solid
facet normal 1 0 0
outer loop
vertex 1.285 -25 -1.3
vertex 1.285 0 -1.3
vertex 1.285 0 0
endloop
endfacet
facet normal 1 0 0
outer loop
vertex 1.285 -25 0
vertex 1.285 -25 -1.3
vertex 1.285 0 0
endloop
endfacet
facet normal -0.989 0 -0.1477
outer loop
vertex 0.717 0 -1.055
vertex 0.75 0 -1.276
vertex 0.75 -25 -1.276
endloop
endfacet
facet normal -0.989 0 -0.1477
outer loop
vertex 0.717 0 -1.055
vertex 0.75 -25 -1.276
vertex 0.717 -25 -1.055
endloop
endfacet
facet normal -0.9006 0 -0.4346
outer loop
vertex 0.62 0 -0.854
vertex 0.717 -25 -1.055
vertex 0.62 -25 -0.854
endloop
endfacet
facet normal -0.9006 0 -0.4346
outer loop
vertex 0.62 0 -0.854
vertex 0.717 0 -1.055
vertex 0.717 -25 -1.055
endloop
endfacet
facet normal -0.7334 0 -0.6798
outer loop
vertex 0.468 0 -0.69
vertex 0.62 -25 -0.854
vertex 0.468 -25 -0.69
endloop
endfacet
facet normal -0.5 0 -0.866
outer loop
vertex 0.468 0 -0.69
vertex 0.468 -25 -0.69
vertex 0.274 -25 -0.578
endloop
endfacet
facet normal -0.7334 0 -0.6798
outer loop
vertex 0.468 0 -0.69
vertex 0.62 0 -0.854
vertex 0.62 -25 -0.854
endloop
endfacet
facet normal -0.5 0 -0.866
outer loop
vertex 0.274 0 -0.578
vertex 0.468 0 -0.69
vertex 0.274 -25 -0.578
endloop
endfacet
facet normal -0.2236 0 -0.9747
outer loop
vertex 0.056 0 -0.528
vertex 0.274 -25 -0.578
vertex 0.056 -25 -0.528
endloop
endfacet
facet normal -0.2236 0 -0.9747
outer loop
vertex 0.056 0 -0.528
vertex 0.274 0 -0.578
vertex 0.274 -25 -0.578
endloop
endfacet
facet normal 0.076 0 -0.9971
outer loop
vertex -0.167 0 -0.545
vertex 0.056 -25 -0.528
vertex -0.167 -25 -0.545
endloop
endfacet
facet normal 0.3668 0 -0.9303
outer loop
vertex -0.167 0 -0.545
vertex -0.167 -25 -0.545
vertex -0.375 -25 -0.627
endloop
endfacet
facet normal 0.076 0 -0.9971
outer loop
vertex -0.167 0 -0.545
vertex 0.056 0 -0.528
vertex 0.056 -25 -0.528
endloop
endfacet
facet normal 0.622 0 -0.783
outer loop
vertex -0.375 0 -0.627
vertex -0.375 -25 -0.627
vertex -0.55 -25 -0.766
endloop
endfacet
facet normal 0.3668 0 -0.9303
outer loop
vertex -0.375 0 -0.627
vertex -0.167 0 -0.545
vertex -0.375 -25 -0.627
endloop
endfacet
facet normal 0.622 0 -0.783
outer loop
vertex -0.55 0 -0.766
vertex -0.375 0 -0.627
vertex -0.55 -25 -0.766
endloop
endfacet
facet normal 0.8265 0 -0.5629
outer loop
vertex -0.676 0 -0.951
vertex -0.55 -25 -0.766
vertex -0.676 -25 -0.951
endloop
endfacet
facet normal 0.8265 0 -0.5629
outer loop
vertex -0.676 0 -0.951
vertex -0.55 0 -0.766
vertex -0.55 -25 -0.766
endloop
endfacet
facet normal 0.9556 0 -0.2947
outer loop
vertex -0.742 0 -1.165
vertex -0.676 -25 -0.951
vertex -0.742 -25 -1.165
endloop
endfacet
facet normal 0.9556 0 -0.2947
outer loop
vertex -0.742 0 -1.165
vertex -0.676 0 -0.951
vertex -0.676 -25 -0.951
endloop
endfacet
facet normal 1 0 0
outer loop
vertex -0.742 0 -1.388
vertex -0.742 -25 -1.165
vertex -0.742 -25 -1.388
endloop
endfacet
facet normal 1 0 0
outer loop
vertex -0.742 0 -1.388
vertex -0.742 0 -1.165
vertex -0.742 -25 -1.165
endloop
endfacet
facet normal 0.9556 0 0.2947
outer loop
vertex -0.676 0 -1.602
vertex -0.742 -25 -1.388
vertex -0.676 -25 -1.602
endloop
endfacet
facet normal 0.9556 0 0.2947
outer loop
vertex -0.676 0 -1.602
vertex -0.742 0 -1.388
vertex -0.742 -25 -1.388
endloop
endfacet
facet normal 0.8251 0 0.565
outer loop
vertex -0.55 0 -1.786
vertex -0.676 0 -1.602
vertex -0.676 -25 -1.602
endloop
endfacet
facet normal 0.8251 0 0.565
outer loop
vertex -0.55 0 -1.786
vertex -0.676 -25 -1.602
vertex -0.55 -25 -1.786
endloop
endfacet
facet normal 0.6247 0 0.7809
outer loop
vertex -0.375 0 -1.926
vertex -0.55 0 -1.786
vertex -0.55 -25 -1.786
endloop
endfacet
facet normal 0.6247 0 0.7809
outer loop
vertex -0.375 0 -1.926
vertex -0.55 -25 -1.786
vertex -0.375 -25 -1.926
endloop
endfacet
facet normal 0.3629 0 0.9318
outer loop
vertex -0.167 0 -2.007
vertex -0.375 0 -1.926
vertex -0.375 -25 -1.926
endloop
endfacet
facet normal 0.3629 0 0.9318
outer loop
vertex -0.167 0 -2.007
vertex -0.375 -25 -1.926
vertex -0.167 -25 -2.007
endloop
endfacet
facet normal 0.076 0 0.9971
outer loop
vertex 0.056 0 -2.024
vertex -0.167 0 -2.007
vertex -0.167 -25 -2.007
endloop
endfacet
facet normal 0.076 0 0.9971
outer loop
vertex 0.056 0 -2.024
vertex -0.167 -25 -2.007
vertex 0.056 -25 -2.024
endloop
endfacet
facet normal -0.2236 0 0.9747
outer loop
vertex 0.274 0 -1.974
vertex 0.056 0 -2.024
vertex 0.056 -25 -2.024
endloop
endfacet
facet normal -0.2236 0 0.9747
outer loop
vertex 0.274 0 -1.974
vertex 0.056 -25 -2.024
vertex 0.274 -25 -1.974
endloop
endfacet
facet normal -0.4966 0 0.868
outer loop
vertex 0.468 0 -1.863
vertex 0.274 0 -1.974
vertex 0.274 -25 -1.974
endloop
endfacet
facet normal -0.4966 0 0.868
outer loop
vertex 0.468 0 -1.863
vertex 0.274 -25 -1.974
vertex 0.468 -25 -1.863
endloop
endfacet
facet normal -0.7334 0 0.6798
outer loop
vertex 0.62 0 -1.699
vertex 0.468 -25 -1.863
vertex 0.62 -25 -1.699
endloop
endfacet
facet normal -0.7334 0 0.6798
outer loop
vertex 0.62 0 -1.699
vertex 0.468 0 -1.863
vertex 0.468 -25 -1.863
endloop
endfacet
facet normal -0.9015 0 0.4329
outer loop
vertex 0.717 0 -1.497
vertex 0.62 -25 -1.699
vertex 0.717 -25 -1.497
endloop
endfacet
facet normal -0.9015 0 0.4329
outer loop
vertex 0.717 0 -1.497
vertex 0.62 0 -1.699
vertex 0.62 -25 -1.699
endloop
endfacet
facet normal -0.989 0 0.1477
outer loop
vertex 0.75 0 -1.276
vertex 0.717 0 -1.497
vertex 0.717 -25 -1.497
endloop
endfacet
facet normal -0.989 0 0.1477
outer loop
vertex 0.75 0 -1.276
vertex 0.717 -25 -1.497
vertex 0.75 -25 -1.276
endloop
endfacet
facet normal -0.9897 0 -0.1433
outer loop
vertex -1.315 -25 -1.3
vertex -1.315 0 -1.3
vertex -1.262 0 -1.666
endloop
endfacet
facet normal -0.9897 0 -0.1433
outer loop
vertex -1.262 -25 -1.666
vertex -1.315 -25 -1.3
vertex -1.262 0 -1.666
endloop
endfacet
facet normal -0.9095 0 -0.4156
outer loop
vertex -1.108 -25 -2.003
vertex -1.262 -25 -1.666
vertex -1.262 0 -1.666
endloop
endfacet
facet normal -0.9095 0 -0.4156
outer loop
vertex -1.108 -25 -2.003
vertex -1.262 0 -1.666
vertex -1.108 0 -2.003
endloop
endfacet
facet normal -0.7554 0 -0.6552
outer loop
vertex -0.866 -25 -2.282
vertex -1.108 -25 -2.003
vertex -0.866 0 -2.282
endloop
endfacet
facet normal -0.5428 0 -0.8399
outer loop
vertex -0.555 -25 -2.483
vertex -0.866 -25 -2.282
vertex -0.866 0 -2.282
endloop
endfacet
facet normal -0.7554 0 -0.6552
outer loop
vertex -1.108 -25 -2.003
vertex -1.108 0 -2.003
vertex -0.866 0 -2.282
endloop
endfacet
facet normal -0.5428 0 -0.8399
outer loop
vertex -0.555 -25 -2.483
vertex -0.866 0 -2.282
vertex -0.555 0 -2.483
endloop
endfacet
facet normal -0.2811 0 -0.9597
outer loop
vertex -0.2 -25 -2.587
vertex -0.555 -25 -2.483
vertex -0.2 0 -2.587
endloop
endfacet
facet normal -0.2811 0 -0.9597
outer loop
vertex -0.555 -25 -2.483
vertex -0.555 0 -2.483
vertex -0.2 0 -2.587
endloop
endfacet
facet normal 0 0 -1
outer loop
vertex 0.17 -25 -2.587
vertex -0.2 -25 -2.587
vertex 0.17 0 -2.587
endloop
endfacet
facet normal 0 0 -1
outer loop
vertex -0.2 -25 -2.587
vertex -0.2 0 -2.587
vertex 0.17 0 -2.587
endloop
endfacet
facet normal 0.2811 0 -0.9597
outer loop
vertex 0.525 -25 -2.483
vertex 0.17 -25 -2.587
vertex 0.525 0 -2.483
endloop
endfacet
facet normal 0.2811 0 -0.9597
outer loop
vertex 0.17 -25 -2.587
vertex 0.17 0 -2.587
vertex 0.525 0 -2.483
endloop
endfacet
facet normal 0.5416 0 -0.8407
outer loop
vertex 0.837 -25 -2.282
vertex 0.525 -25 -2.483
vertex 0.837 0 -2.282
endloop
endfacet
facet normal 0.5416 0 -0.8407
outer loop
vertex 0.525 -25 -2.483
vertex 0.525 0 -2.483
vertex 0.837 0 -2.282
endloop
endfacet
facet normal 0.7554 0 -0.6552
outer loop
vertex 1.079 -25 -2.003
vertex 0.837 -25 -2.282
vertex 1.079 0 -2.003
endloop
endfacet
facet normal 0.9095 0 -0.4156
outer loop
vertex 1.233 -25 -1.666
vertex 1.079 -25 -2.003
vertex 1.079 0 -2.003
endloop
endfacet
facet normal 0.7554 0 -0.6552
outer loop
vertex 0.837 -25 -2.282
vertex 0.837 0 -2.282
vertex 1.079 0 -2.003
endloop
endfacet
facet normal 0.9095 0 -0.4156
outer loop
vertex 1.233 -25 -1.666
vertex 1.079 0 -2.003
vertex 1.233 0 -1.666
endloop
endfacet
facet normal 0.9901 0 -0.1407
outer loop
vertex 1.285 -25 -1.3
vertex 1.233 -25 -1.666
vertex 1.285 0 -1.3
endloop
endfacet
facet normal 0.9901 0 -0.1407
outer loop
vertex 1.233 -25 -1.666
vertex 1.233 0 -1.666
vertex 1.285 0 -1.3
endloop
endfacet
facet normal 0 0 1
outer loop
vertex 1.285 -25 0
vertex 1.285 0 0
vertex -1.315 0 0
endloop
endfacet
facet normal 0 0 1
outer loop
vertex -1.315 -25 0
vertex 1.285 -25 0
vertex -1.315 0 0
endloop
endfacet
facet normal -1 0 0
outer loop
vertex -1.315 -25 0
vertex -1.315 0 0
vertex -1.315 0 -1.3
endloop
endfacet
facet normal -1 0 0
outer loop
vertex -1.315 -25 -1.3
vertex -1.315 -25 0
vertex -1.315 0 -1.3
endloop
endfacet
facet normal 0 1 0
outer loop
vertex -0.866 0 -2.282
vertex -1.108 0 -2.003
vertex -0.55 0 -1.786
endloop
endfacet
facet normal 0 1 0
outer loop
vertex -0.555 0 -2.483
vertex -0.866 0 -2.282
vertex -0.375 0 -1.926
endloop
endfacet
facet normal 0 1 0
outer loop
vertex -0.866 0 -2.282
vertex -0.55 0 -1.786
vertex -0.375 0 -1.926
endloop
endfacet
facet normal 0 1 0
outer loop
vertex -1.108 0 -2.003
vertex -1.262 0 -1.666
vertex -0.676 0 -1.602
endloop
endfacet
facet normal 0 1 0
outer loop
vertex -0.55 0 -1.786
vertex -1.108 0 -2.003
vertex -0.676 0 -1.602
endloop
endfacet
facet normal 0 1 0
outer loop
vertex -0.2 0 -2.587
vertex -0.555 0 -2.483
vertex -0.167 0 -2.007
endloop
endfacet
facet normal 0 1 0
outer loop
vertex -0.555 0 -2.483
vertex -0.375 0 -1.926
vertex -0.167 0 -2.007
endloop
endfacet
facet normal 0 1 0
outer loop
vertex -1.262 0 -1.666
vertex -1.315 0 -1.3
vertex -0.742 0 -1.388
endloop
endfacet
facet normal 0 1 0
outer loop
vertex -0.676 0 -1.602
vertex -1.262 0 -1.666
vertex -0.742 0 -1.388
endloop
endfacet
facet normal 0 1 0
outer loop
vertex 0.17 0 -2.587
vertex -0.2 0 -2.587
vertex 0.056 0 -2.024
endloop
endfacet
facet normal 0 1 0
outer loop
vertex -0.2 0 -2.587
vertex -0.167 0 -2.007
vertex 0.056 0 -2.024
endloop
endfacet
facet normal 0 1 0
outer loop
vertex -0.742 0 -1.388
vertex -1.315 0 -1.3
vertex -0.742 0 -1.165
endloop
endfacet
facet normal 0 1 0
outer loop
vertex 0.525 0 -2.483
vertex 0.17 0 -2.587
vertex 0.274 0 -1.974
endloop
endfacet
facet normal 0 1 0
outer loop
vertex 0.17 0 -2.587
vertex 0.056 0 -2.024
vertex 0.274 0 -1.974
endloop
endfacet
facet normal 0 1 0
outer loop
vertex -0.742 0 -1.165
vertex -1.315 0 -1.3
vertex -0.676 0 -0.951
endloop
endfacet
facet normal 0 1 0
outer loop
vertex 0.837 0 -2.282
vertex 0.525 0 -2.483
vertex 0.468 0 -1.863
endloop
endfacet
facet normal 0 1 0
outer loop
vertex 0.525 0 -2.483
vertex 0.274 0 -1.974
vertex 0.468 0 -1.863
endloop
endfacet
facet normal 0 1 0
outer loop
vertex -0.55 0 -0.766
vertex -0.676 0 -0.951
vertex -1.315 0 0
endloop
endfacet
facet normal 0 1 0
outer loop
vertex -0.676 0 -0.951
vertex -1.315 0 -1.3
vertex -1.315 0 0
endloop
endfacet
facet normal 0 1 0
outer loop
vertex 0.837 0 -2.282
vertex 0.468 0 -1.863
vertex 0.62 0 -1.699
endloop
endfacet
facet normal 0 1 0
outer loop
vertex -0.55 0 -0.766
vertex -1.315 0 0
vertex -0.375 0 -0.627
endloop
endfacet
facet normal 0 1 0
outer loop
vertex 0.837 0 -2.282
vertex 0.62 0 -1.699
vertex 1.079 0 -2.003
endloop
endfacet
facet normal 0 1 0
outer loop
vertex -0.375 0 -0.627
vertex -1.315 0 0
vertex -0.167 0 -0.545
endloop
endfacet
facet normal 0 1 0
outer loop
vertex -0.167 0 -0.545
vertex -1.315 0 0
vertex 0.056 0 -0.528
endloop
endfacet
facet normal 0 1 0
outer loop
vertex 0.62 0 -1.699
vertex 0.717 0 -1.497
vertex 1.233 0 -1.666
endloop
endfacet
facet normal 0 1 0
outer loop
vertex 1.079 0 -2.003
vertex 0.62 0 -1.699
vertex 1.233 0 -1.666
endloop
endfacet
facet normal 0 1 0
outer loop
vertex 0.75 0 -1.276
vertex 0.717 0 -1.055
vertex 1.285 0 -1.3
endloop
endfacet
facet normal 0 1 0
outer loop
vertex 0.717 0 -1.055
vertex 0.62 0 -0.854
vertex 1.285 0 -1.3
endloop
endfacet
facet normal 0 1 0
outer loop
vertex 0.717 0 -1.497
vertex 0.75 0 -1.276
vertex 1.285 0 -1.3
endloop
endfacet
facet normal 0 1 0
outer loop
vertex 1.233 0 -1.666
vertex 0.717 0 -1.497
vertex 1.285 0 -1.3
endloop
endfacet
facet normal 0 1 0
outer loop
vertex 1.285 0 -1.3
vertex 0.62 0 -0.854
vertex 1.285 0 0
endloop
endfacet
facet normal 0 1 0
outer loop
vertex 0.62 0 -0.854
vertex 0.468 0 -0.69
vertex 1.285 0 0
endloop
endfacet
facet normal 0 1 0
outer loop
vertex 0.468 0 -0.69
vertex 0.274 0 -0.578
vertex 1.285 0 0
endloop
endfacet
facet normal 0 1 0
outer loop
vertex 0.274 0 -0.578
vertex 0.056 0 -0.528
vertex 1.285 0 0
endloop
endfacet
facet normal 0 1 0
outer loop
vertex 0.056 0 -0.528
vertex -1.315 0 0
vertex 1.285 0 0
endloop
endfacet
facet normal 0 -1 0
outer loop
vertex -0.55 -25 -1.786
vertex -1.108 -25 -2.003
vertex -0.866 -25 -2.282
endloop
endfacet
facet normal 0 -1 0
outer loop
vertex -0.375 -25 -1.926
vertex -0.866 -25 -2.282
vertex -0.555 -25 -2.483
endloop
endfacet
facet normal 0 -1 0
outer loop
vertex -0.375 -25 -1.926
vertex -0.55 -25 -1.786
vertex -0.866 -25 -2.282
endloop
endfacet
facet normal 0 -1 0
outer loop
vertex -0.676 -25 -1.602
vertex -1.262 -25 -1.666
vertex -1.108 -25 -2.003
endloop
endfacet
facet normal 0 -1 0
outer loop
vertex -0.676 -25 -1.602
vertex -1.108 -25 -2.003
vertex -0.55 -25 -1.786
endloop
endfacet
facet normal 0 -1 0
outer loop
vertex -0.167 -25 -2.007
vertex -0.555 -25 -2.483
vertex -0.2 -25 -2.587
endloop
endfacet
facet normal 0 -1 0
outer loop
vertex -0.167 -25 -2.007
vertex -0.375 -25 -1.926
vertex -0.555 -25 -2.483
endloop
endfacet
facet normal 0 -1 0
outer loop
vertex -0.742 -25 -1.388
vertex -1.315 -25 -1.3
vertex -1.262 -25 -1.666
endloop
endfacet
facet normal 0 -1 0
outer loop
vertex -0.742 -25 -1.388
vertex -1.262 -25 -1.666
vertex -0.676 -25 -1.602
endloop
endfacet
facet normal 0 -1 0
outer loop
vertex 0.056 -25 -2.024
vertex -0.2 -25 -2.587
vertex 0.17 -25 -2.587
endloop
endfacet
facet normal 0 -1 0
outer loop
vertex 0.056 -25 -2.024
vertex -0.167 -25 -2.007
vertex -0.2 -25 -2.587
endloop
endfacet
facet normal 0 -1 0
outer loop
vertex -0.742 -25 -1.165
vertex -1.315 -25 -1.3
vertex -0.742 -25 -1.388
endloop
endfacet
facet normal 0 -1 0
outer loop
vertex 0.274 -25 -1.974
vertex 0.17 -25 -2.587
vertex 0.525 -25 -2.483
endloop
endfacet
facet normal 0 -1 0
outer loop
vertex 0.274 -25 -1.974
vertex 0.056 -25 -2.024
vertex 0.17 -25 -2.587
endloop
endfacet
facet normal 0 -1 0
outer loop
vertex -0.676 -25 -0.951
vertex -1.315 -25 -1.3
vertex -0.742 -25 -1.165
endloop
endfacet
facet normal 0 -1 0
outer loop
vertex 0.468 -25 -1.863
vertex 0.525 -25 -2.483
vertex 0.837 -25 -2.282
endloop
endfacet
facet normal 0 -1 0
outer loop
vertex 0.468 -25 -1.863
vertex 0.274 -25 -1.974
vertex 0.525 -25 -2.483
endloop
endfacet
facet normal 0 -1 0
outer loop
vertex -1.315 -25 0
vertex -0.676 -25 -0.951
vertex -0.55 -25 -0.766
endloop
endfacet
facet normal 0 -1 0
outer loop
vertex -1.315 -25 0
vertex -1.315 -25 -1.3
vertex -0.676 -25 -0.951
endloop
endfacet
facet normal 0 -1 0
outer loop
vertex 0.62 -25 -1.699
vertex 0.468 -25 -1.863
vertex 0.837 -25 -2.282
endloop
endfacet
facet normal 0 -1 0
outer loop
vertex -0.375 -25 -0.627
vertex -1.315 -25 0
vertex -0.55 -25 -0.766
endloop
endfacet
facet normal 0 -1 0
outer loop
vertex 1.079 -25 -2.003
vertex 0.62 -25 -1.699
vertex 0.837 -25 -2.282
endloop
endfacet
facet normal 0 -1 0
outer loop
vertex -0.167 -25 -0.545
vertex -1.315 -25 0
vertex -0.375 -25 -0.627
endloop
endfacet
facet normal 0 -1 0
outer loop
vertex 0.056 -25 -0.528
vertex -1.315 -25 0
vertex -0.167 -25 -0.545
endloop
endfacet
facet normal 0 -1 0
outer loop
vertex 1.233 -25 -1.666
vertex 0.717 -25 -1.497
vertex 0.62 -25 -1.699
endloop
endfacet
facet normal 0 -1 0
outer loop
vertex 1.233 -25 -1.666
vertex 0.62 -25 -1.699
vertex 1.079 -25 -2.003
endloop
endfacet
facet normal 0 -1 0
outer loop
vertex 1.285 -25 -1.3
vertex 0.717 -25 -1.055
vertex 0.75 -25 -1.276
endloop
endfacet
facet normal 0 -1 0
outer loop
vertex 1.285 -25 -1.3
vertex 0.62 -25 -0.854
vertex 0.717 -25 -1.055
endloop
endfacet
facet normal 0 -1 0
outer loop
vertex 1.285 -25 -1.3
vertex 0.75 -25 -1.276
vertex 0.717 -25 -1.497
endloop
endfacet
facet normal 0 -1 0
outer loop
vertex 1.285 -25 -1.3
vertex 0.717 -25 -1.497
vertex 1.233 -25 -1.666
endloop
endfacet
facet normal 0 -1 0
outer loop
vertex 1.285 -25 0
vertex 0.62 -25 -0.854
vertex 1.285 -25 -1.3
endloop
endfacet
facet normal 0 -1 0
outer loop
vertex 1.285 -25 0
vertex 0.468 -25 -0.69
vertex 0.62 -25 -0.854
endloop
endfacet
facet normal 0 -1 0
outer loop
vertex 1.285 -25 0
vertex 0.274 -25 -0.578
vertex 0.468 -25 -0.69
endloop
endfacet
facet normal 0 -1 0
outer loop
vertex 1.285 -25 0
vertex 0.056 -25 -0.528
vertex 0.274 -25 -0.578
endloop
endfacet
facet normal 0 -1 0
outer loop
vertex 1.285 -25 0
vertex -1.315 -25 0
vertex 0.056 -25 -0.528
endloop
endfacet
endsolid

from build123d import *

# Parameters (mm, degrees)
F1_DEPTH = 25
F2_R     = 0.75
F3_DEPTH = 25


with BuildPart() as f1:
    # F0 (on Front) → F1 (new body)
    with BuildSketch(Plane.XZ):
        with BuildLine():
            Line((1.285368, 0), (-1.314632, 0))
            Line((-1.314632, 0), (-1.314632, -1.3))
            ThreePointArc((-1.314632, -1.3), (-0.014632, -2.6), (1.285368, -1.3))
            Line((1.285368, -1.3), (1.285368, 0))
        make_face()
    extrude(amount=F1_DEPTH)

    # F2 (on Front) → F3 (cut)
    with BuildSketch(Plane.XZ):
        with Locations((0, -1.276303)):
            Circle(F2_R)
    extrude(amount=F3_DEPTH, mode=Mode.SUBTRACT)


solid = f1.part
